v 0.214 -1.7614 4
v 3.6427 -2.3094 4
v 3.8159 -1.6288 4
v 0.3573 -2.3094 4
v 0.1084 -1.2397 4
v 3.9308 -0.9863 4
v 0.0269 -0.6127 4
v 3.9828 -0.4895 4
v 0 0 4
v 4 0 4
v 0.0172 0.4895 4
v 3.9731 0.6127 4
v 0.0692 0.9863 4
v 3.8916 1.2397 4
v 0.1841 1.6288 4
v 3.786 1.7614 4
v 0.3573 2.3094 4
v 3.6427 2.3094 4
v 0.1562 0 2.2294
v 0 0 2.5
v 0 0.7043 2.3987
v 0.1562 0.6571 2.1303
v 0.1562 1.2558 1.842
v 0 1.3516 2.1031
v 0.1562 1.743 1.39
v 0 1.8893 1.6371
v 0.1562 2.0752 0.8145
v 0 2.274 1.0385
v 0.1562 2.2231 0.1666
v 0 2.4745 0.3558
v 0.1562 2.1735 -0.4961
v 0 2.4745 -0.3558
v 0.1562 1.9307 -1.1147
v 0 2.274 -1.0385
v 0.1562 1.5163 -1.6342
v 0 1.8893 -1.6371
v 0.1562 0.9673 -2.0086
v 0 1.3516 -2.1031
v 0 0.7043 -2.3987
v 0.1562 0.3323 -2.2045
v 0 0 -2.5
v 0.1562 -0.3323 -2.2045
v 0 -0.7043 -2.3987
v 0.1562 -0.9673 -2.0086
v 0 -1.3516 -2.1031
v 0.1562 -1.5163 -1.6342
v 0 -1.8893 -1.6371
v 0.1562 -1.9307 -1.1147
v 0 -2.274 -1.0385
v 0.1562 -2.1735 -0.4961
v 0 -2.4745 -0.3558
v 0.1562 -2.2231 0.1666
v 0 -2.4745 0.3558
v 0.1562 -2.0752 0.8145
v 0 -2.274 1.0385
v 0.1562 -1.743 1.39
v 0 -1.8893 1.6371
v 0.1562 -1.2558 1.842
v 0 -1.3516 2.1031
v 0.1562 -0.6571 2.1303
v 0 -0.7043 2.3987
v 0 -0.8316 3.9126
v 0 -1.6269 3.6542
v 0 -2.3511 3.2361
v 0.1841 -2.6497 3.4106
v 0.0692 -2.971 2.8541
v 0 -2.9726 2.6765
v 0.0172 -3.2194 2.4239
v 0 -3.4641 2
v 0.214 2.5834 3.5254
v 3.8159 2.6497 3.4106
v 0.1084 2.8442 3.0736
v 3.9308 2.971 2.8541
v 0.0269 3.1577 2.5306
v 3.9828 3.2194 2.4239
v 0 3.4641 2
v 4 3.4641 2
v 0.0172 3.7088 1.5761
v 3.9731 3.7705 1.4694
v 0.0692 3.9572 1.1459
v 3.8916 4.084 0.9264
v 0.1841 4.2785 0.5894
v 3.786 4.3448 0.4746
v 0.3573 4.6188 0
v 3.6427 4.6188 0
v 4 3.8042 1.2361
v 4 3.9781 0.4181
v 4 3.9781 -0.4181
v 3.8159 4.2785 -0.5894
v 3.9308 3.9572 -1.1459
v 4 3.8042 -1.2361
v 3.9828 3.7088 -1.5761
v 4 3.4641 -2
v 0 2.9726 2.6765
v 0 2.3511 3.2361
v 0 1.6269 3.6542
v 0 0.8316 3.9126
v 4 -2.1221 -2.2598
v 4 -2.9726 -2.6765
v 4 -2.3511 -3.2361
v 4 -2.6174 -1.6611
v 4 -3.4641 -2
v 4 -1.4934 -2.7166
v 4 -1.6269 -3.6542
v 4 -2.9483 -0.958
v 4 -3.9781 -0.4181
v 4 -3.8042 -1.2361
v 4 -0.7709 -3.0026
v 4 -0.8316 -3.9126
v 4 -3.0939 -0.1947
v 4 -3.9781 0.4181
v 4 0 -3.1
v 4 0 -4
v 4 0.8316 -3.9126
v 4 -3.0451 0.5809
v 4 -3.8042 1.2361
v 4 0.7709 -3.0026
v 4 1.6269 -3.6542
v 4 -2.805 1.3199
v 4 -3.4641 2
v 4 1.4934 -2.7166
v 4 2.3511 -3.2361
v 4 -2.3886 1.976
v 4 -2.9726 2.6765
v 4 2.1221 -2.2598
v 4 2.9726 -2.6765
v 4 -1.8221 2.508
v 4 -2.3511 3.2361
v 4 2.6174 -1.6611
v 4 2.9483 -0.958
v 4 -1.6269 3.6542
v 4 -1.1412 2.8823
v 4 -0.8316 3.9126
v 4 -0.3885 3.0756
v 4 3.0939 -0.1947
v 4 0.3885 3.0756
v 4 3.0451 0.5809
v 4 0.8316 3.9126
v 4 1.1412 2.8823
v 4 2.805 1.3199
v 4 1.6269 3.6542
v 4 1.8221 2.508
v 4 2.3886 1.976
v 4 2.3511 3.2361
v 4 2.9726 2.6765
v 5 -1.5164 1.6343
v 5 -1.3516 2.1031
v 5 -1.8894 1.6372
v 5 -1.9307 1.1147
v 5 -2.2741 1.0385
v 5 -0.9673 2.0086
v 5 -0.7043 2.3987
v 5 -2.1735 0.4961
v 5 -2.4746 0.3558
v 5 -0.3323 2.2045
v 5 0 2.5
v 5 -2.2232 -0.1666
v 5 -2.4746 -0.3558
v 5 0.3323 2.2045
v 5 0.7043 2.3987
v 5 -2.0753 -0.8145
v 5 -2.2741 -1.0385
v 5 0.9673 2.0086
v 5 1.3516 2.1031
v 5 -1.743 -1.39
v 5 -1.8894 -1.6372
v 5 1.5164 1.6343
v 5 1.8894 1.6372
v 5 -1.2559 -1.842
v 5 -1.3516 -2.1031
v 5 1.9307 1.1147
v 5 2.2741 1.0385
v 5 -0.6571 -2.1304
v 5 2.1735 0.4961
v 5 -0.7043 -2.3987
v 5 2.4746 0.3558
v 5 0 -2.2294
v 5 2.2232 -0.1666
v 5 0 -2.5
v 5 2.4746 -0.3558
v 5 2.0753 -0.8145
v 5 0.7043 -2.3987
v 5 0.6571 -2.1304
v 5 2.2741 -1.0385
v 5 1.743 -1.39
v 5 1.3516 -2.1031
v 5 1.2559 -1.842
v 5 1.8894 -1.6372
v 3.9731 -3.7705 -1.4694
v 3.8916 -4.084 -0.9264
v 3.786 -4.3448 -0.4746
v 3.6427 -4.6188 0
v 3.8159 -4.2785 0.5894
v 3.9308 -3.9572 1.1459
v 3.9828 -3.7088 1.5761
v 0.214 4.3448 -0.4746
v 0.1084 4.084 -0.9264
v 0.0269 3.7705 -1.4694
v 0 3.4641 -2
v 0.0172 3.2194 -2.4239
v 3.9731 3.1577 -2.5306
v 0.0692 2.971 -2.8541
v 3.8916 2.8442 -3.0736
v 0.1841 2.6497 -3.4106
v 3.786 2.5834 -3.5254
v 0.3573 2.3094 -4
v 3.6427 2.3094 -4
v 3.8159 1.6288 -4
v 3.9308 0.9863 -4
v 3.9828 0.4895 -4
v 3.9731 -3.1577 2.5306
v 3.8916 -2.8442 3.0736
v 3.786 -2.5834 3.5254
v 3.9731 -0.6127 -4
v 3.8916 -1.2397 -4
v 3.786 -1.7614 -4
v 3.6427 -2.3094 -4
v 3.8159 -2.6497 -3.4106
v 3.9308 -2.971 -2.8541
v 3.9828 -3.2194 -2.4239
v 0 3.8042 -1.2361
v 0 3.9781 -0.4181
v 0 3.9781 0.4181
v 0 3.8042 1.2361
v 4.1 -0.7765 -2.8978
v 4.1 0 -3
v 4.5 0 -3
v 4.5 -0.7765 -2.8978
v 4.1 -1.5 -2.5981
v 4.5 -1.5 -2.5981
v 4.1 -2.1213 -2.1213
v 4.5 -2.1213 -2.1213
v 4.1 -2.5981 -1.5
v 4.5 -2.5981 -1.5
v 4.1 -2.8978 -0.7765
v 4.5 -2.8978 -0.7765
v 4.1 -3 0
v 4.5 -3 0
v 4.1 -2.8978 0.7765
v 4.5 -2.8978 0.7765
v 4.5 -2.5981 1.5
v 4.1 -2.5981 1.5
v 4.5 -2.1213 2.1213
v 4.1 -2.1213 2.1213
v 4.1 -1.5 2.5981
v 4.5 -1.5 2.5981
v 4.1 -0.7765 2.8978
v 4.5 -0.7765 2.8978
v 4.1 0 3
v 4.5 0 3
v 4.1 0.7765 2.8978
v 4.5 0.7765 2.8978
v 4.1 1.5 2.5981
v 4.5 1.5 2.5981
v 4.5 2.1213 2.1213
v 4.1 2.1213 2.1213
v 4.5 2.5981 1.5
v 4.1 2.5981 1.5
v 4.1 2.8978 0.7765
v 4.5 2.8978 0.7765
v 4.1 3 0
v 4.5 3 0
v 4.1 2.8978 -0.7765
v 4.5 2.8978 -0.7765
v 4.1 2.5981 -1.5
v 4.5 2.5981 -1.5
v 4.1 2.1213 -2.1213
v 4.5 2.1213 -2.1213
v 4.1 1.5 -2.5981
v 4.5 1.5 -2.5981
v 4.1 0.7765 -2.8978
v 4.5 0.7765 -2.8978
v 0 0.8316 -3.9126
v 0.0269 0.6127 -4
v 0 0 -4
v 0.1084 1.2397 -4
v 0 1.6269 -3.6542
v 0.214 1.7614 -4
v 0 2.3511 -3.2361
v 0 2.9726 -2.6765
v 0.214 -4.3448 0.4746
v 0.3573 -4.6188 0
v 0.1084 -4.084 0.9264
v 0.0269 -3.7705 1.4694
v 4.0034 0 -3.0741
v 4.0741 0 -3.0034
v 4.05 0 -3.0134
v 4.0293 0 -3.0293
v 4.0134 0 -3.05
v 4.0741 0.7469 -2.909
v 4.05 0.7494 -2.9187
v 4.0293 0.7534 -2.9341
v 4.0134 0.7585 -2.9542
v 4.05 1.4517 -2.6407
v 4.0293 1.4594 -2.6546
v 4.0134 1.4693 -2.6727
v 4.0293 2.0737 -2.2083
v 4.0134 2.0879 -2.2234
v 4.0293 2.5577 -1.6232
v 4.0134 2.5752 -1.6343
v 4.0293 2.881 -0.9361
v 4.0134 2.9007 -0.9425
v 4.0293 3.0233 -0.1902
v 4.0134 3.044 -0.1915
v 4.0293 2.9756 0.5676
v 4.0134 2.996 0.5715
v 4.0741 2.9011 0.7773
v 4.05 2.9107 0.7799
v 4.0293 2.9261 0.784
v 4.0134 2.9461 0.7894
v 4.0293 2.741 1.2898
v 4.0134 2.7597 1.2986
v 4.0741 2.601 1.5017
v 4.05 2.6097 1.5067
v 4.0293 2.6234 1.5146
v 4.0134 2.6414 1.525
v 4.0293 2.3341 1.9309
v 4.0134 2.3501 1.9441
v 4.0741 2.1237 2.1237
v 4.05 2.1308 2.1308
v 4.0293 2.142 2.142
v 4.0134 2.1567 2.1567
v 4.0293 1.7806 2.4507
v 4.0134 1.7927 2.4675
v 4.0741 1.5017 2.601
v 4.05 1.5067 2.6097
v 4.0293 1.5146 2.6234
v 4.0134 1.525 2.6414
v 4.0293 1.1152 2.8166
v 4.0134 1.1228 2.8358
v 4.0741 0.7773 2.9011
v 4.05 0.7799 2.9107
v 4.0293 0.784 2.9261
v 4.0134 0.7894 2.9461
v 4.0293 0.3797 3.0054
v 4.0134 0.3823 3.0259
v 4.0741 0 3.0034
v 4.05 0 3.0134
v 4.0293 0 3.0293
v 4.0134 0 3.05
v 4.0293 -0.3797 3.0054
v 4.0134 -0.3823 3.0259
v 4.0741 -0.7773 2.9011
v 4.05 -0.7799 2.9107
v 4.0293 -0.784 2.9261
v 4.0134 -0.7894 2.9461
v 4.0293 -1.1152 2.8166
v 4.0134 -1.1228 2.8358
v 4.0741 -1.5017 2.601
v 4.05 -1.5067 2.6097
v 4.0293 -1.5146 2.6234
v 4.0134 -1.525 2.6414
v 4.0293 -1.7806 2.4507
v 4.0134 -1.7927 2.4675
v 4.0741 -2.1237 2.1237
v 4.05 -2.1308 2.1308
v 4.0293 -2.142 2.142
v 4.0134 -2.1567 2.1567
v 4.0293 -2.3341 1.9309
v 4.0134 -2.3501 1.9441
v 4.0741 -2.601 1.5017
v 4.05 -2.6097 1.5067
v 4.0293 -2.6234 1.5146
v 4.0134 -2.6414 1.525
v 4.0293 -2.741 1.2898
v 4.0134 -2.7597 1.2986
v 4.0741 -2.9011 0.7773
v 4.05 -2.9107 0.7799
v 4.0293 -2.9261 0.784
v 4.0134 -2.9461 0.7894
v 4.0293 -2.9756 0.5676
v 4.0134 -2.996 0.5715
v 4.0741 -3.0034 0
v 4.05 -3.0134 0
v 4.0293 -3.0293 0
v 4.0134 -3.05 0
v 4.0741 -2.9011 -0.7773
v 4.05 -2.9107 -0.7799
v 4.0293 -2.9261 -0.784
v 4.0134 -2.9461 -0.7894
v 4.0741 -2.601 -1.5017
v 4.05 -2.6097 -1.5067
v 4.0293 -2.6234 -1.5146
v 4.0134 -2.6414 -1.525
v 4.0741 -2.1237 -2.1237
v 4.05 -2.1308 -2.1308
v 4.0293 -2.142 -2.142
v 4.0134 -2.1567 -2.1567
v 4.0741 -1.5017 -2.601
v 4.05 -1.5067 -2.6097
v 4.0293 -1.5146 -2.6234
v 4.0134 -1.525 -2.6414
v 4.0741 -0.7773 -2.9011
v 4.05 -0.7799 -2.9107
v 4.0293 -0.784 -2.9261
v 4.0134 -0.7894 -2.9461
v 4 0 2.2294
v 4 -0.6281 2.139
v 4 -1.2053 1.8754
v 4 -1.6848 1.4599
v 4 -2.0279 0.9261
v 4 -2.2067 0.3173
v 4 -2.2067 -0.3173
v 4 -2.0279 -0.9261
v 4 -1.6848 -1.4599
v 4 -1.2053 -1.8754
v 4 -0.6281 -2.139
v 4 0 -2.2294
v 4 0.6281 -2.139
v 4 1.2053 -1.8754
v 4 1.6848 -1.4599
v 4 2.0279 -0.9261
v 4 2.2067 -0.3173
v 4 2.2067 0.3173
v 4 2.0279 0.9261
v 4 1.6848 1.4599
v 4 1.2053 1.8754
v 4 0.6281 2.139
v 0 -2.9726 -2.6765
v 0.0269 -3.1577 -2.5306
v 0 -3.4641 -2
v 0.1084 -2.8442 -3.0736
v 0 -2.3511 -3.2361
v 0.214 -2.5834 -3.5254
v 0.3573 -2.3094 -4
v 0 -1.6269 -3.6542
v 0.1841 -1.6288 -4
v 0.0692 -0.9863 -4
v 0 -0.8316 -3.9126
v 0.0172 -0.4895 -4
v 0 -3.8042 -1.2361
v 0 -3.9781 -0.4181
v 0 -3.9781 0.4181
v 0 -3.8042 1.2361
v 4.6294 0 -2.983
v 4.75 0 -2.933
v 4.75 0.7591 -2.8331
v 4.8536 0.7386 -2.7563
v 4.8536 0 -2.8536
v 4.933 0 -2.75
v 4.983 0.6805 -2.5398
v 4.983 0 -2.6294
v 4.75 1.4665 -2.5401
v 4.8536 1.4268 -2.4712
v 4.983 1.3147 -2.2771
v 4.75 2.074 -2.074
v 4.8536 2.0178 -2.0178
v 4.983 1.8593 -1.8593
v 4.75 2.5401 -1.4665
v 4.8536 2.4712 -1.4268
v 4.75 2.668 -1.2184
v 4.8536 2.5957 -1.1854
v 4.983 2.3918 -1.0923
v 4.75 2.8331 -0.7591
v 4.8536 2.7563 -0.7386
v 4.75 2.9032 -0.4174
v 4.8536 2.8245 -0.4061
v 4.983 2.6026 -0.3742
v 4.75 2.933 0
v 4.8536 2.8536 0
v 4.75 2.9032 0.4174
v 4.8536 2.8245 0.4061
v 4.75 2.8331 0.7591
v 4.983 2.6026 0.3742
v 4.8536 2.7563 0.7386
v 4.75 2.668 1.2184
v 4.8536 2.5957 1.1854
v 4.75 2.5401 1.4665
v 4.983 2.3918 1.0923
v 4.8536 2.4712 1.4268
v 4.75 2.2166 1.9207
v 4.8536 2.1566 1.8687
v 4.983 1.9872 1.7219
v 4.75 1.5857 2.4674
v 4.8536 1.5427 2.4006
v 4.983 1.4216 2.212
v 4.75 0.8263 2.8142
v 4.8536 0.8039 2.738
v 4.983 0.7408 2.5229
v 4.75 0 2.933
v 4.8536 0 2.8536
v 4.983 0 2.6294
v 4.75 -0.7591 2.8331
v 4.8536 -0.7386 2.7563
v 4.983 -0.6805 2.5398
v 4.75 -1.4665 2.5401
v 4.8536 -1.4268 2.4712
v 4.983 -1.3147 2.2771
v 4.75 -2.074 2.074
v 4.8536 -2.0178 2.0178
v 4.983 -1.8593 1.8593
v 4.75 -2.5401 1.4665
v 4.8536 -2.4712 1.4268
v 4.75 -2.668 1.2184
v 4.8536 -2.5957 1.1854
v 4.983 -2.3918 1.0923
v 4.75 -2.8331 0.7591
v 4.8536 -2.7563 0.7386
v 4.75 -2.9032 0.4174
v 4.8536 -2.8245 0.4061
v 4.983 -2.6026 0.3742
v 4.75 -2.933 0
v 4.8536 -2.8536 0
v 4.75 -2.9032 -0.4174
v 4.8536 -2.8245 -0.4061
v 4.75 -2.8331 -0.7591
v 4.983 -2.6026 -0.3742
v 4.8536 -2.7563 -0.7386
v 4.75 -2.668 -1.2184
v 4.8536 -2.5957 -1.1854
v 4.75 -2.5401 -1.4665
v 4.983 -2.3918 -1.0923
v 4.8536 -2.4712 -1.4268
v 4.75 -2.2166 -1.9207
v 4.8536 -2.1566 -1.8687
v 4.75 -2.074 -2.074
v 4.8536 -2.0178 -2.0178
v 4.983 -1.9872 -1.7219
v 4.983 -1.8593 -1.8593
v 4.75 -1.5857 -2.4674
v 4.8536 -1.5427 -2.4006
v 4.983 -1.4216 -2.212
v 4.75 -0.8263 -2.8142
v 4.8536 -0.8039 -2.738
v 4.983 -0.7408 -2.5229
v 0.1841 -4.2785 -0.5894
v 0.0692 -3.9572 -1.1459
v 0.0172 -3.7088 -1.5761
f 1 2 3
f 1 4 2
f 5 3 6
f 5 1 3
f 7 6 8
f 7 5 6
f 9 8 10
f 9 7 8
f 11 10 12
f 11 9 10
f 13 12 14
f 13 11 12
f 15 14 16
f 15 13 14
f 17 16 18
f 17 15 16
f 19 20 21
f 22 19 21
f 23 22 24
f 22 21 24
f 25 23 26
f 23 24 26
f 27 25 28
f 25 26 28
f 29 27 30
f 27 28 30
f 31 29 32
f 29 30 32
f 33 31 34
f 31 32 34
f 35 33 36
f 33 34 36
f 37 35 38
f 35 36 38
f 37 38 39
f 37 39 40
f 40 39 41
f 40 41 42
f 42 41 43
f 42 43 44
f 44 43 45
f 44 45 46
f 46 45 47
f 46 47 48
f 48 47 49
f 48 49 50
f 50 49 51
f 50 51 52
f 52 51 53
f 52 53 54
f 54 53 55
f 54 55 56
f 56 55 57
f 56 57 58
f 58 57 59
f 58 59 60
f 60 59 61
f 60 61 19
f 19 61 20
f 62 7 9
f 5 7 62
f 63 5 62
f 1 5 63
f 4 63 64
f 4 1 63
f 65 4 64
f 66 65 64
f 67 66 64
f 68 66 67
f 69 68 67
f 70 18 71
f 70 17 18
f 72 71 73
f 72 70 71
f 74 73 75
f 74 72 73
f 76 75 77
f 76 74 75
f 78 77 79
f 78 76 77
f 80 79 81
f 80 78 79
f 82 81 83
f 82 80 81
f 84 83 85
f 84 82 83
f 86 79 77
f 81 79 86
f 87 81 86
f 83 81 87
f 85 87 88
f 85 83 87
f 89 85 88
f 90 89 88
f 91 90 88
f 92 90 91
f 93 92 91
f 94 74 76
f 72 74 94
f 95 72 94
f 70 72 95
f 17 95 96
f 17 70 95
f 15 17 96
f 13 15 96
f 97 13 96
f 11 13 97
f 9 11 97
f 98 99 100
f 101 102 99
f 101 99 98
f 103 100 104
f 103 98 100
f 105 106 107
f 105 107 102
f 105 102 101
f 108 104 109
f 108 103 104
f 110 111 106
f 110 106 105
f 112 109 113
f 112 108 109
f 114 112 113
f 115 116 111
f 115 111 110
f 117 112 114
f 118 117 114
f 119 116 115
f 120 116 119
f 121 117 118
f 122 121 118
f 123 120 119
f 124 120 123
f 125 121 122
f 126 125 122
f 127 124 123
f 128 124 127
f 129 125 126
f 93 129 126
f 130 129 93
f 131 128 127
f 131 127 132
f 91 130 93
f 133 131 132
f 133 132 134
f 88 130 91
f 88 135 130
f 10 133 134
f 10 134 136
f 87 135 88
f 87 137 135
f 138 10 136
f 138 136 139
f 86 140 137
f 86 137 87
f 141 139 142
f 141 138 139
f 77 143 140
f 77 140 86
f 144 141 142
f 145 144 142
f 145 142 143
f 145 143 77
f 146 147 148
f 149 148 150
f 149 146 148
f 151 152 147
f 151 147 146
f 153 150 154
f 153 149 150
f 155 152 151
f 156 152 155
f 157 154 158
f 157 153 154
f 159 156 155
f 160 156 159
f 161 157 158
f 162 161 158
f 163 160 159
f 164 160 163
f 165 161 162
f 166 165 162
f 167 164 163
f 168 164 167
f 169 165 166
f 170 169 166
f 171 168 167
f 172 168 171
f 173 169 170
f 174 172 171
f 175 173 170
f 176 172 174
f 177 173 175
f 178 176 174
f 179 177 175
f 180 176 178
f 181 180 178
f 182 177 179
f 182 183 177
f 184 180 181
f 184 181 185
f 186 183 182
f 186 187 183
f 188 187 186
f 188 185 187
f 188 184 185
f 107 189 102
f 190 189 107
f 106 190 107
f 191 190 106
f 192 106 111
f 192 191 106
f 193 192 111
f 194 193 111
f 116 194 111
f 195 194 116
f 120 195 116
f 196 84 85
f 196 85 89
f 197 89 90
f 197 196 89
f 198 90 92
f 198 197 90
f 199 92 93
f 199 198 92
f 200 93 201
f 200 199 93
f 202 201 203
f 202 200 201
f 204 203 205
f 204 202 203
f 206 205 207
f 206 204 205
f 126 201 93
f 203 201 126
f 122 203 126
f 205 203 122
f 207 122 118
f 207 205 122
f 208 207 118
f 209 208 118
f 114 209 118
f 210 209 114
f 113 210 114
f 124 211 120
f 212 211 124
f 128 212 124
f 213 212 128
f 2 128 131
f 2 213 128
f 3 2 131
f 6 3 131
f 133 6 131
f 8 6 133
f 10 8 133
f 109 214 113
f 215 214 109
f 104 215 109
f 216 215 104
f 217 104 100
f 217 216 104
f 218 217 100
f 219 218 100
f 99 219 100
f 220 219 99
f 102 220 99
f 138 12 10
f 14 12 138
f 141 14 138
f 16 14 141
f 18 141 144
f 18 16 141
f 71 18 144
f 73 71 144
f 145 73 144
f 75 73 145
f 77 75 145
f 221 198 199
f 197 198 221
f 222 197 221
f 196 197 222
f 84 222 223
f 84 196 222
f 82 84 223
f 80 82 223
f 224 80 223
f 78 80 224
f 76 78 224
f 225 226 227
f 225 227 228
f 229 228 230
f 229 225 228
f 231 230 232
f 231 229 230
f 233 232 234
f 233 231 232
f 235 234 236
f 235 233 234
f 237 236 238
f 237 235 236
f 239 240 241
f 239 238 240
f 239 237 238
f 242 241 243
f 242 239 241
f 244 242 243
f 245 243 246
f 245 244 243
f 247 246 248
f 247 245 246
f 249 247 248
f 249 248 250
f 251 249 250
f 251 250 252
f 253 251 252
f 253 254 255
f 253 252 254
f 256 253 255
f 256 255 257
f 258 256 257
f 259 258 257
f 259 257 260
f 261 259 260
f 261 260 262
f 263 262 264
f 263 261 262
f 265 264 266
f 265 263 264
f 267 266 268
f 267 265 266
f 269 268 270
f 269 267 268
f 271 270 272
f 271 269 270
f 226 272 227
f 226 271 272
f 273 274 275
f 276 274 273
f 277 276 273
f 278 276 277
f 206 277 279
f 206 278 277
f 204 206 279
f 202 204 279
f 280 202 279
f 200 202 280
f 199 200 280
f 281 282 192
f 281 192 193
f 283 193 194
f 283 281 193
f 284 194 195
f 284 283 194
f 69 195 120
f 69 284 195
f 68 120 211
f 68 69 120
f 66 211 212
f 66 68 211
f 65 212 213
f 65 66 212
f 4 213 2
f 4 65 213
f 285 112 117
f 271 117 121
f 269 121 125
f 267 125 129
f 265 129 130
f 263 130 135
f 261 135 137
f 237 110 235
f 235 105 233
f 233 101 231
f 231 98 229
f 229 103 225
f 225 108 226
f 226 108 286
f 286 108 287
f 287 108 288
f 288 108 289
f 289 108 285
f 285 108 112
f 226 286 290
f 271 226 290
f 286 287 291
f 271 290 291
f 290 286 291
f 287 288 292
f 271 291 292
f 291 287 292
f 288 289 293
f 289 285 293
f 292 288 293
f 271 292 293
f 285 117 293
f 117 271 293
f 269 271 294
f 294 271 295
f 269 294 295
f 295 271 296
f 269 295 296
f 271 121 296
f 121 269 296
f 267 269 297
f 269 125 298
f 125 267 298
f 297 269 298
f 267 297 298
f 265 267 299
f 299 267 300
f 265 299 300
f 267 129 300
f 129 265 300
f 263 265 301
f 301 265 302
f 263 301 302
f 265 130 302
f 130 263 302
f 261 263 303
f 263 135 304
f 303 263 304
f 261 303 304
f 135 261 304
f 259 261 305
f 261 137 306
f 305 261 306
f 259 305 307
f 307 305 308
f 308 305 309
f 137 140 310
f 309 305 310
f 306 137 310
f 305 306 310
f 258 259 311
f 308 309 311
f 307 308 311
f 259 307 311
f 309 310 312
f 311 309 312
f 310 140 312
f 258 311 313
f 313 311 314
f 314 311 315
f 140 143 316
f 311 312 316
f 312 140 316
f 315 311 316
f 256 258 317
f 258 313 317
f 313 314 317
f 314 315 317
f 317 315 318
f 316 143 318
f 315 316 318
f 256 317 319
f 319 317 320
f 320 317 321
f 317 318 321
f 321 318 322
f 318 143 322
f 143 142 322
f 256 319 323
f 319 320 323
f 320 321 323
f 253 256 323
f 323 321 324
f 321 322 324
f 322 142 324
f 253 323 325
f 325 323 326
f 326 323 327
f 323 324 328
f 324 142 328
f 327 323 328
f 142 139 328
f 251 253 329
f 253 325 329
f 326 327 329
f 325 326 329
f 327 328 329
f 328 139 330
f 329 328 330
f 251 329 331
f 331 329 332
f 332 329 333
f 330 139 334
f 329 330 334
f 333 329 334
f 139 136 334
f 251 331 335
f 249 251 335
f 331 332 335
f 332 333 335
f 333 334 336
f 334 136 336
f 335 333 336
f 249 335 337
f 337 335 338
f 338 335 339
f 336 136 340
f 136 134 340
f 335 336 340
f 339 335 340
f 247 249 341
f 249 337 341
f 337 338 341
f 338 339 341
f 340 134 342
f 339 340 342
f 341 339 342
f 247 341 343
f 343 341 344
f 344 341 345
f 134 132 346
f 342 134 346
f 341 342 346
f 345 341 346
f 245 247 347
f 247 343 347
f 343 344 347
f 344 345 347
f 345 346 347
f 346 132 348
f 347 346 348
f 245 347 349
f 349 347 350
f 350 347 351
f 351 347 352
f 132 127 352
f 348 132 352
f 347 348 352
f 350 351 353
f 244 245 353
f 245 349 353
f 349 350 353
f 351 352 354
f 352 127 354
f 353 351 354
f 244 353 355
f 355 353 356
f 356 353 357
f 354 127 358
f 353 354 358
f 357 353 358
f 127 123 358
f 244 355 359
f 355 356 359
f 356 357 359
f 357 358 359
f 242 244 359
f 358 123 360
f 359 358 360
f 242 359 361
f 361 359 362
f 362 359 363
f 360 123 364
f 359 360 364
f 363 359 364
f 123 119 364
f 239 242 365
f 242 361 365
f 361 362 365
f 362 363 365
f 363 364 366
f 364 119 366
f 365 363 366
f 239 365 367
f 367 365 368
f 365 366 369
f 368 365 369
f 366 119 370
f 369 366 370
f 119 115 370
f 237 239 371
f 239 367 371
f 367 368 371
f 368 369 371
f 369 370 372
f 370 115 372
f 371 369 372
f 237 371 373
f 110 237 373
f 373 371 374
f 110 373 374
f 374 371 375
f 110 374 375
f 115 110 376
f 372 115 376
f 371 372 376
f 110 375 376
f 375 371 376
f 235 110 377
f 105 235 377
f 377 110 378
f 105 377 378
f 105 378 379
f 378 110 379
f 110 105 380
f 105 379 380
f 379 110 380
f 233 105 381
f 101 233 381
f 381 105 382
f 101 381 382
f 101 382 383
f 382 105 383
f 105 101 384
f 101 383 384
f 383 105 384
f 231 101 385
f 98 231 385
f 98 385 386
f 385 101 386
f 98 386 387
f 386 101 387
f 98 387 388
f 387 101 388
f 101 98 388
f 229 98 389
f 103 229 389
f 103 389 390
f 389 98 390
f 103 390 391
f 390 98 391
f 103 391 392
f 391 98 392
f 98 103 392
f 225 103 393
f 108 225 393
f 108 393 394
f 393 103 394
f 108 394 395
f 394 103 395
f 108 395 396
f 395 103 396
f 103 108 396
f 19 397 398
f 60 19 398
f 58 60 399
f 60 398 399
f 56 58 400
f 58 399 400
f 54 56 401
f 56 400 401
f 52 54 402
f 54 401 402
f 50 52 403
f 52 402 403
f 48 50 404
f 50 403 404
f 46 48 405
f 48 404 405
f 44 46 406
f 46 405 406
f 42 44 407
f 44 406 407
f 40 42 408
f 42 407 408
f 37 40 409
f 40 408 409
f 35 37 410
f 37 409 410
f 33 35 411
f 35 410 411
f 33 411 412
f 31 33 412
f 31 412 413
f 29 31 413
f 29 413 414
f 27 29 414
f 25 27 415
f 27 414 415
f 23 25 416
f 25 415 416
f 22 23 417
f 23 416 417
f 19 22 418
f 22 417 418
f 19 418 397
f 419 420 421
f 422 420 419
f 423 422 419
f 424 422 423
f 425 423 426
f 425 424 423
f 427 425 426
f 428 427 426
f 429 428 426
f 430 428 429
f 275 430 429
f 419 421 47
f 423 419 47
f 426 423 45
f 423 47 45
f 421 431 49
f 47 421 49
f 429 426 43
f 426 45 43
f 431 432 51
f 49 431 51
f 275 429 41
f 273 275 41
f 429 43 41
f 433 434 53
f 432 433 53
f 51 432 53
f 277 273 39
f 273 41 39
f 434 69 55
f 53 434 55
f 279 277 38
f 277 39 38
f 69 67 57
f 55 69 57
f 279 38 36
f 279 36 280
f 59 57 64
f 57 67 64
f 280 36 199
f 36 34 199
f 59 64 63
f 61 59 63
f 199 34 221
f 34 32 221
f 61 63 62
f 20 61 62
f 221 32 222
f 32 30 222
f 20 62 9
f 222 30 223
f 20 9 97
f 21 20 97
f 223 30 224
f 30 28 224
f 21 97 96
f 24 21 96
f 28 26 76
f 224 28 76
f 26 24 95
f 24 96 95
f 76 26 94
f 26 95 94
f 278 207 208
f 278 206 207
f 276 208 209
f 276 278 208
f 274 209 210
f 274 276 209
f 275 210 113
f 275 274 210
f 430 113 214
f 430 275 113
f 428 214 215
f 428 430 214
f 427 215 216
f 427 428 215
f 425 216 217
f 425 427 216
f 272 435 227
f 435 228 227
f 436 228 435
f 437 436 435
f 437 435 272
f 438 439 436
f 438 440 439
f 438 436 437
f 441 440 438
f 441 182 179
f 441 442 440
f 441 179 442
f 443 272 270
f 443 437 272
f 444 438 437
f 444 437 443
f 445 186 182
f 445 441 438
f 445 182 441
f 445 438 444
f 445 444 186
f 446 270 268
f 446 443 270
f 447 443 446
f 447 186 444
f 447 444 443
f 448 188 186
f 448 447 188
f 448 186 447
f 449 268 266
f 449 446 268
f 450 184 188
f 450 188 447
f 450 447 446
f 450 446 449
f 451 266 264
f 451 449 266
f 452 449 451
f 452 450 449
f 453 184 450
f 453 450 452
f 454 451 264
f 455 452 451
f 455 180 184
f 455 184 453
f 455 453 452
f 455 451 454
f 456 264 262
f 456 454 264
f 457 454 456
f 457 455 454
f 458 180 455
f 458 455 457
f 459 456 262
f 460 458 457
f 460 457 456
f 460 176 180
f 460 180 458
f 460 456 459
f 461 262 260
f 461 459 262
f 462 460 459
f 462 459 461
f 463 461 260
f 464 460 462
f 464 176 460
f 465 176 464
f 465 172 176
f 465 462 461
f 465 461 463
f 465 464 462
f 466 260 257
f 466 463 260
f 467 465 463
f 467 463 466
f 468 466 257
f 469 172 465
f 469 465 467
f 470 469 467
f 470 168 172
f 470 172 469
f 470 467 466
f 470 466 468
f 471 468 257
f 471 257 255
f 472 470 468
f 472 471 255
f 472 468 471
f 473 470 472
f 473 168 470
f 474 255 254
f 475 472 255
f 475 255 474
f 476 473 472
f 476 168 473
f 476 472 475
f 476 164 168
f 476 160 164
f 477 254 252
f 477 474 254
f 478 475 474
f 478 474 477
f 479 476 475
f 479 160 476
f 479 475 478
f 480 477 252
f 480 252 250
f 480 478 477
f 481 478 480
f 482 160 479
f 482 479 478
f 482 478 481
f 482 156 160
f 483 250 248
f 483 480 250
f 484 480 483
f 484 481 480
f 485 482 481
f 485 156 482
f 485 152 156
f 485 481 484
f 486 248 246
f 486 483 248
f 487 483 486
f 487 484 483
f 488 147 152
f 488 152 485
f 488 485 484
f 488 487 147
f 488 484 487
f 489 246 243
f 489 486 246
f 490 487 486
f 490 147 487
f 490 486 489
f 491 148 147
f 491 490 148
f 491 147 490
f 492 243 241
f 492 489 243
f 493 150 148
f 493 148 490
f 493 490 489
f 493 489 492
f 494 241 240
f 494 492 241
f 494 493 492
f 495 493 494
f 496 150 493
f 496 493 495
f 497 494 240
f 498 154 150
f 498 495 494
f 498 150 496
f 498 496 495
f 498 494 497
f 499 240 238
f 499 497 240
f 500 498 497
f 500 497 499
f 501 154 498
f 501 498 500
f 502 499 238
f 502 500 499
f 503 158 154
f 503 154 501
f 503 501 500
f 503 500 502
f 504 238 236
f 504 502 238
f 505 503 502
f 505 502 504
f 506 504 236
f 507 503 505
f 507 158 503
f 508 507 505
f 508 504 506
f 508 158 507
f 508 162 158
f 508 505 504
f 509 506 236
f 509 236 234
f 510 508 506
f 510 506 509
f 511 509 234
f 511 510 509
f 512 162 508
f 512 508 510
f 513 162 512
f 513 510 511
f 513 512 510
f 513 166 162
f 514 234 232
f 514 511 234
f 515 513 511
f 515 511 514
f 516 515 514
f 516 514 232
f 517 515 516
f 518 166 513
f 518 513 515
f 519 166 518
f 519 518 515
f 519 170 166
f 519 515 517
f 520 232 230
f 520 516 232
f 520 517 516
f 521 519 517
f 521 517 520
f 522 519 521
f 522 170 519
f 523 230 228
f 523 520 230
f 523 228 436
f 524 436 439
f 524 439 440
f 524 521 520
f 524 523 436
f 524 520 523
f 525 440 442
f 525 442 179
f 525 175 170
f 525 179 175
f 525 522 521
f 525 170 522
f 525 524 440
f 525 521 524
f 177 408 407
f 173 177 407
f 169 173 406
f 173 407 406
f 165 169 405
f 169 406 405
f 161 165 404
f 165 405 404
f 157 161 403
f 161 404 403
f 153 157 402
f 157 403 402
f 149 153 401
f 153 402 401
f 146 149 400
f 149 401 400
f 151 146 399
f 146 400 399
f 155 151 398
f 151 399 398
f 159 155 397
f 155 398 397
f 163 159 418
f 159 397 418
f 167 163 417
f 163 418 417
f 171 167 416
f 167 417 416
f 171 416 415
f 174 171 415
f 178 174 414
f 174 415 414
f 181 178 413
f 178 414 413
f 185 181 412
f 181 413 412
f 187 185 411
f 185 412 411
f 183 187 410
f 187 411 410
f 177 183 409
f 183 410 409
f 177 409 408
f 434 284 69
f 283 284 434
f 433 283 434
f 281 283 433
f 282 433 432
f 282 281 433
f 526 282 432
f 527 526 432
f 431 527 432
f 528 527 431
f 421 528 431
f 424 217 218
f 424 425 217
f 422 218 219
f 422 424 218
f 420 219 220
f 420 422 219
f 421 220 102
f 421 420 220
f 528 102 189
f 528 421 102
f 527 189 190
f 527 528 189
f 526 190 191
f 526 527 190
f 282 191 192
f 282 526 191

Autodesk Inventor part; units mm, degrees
ref_plane "YZ Plane" through (0, 0, 0) normal (1, 0, 0) x (0, 1, 0)
sketch "Sketch1" plane through (0, 0, 0) normal (1, 0, 0) x (0, 1, 0)
  line L0 (4.6188, 0) -> (2.3094, -4)
  line L1 (2.3094, -4) -> (-2.3094, -4)
  line L2 (-2.3094, -4) -> (-4.6188, 0)
  line L3 (-4.6188, 0) -> (-2.3094, 4)
  line L4 (-2.3094, 4) -> (2.3094, 4)
  line L5 (2.3094, 4) -> (4.6188, 0)
  point P0 (0, 0)
  point P1 (0, 0)
  dimension "d0" = 9.2376
extrude "Body" add sketch "Sketch1" along normal blind 4
sketch "Sketch2" plane through (0, 0, 0) normal (-1, 0, 0) x (0, 0, 1)
  point P0 (0, 0)
hole "Thread" at (0, 0, 0) direction (1, 0, 0) diameter 4.4587 end through all thread size "M5x0.5" class "6H" standard "ISO Metric profile"
chamfer "Chamfer1" distance 0.2706 angle 30 1 edges at (0, 0, -2.2294) measured on face at (0, -2.921, 1.7555)
sketch "Sketch3" plane through (0, 0, 0) normal (0, 0, 1) x (1, 0, 0)
  line L0 (0, 4.6188) -> (4, 4.6188) projected
  line L1 (4, 2.3094) -> (4, 4.6188) projected
  line L2 (-0.6, 0) -> (3.6, 0) projected
  line L3 (3.6427, 4.6188) -> (4, 4)
  dimension "d3" = 8
  dimension "d4" = 30
revolve "Chamfer3" cut sketch "Sketch3" angle 360 about axis through (-10, 0, 0) along (1, 0, 0)
ref_plane "Work Plane1" through (12.8582, 0, 0) normal (0, 0.8660254, -0.5) x (-1, 0, 0)
ref_plane "Work Plane2" through (2, 0, 0) normal (1, 0, 0) x (0, 0, -1)
mirror "Mirror1" about plane through (2, 0, 0) normal (1, 0, 0) of "Chamfer3"
sketch "Sketch6" plane through (4, 0, 0) normal (1, 0, 0) x (0, 0, -1)
  circle A0 centre (0, 0) radius 2.2294 projected
  circle A1 centre (0, 0) radius 3
  dimension "d26" = 6
extrude "Extrusion2" add sketch "Sketch6" along normal blind 1
fillet "Fillet1" radius 0.5 1 edges at (5, 0, 3)
fillet "Fillet2" radius 0.1 1 edges at (4, 0, 3)
equation "\"d13\" = -0.5 * GD1 + 0.5 * NND"
equation "\"d21\" = -0.5 * GD1 + 0.5 * NND"
equation "\"d4\" = ANG2"
equation "\"ANG2\" = 30deg"
equation "\"NND\" = 3"
equation "\"KOH\" = 2.4"
equation "\"SW\" = 5.5"
equation "\"SW01\" = SW"
equation "\"GUL\" = 0.541266 * PTC"
equation "\"TOA\" = 30deg"
equation "\"PTC\" = 0.5"
equation "\"E0\" = 1.155 * SW"
equation "\"THREADDIA\" = 3"
equation "\"GAL\" = 0.541266 * PTC"
equation "\"GD1\" = 2.458734"
properties part number "M3 Nylon Nut" material "Stainless Steel"
